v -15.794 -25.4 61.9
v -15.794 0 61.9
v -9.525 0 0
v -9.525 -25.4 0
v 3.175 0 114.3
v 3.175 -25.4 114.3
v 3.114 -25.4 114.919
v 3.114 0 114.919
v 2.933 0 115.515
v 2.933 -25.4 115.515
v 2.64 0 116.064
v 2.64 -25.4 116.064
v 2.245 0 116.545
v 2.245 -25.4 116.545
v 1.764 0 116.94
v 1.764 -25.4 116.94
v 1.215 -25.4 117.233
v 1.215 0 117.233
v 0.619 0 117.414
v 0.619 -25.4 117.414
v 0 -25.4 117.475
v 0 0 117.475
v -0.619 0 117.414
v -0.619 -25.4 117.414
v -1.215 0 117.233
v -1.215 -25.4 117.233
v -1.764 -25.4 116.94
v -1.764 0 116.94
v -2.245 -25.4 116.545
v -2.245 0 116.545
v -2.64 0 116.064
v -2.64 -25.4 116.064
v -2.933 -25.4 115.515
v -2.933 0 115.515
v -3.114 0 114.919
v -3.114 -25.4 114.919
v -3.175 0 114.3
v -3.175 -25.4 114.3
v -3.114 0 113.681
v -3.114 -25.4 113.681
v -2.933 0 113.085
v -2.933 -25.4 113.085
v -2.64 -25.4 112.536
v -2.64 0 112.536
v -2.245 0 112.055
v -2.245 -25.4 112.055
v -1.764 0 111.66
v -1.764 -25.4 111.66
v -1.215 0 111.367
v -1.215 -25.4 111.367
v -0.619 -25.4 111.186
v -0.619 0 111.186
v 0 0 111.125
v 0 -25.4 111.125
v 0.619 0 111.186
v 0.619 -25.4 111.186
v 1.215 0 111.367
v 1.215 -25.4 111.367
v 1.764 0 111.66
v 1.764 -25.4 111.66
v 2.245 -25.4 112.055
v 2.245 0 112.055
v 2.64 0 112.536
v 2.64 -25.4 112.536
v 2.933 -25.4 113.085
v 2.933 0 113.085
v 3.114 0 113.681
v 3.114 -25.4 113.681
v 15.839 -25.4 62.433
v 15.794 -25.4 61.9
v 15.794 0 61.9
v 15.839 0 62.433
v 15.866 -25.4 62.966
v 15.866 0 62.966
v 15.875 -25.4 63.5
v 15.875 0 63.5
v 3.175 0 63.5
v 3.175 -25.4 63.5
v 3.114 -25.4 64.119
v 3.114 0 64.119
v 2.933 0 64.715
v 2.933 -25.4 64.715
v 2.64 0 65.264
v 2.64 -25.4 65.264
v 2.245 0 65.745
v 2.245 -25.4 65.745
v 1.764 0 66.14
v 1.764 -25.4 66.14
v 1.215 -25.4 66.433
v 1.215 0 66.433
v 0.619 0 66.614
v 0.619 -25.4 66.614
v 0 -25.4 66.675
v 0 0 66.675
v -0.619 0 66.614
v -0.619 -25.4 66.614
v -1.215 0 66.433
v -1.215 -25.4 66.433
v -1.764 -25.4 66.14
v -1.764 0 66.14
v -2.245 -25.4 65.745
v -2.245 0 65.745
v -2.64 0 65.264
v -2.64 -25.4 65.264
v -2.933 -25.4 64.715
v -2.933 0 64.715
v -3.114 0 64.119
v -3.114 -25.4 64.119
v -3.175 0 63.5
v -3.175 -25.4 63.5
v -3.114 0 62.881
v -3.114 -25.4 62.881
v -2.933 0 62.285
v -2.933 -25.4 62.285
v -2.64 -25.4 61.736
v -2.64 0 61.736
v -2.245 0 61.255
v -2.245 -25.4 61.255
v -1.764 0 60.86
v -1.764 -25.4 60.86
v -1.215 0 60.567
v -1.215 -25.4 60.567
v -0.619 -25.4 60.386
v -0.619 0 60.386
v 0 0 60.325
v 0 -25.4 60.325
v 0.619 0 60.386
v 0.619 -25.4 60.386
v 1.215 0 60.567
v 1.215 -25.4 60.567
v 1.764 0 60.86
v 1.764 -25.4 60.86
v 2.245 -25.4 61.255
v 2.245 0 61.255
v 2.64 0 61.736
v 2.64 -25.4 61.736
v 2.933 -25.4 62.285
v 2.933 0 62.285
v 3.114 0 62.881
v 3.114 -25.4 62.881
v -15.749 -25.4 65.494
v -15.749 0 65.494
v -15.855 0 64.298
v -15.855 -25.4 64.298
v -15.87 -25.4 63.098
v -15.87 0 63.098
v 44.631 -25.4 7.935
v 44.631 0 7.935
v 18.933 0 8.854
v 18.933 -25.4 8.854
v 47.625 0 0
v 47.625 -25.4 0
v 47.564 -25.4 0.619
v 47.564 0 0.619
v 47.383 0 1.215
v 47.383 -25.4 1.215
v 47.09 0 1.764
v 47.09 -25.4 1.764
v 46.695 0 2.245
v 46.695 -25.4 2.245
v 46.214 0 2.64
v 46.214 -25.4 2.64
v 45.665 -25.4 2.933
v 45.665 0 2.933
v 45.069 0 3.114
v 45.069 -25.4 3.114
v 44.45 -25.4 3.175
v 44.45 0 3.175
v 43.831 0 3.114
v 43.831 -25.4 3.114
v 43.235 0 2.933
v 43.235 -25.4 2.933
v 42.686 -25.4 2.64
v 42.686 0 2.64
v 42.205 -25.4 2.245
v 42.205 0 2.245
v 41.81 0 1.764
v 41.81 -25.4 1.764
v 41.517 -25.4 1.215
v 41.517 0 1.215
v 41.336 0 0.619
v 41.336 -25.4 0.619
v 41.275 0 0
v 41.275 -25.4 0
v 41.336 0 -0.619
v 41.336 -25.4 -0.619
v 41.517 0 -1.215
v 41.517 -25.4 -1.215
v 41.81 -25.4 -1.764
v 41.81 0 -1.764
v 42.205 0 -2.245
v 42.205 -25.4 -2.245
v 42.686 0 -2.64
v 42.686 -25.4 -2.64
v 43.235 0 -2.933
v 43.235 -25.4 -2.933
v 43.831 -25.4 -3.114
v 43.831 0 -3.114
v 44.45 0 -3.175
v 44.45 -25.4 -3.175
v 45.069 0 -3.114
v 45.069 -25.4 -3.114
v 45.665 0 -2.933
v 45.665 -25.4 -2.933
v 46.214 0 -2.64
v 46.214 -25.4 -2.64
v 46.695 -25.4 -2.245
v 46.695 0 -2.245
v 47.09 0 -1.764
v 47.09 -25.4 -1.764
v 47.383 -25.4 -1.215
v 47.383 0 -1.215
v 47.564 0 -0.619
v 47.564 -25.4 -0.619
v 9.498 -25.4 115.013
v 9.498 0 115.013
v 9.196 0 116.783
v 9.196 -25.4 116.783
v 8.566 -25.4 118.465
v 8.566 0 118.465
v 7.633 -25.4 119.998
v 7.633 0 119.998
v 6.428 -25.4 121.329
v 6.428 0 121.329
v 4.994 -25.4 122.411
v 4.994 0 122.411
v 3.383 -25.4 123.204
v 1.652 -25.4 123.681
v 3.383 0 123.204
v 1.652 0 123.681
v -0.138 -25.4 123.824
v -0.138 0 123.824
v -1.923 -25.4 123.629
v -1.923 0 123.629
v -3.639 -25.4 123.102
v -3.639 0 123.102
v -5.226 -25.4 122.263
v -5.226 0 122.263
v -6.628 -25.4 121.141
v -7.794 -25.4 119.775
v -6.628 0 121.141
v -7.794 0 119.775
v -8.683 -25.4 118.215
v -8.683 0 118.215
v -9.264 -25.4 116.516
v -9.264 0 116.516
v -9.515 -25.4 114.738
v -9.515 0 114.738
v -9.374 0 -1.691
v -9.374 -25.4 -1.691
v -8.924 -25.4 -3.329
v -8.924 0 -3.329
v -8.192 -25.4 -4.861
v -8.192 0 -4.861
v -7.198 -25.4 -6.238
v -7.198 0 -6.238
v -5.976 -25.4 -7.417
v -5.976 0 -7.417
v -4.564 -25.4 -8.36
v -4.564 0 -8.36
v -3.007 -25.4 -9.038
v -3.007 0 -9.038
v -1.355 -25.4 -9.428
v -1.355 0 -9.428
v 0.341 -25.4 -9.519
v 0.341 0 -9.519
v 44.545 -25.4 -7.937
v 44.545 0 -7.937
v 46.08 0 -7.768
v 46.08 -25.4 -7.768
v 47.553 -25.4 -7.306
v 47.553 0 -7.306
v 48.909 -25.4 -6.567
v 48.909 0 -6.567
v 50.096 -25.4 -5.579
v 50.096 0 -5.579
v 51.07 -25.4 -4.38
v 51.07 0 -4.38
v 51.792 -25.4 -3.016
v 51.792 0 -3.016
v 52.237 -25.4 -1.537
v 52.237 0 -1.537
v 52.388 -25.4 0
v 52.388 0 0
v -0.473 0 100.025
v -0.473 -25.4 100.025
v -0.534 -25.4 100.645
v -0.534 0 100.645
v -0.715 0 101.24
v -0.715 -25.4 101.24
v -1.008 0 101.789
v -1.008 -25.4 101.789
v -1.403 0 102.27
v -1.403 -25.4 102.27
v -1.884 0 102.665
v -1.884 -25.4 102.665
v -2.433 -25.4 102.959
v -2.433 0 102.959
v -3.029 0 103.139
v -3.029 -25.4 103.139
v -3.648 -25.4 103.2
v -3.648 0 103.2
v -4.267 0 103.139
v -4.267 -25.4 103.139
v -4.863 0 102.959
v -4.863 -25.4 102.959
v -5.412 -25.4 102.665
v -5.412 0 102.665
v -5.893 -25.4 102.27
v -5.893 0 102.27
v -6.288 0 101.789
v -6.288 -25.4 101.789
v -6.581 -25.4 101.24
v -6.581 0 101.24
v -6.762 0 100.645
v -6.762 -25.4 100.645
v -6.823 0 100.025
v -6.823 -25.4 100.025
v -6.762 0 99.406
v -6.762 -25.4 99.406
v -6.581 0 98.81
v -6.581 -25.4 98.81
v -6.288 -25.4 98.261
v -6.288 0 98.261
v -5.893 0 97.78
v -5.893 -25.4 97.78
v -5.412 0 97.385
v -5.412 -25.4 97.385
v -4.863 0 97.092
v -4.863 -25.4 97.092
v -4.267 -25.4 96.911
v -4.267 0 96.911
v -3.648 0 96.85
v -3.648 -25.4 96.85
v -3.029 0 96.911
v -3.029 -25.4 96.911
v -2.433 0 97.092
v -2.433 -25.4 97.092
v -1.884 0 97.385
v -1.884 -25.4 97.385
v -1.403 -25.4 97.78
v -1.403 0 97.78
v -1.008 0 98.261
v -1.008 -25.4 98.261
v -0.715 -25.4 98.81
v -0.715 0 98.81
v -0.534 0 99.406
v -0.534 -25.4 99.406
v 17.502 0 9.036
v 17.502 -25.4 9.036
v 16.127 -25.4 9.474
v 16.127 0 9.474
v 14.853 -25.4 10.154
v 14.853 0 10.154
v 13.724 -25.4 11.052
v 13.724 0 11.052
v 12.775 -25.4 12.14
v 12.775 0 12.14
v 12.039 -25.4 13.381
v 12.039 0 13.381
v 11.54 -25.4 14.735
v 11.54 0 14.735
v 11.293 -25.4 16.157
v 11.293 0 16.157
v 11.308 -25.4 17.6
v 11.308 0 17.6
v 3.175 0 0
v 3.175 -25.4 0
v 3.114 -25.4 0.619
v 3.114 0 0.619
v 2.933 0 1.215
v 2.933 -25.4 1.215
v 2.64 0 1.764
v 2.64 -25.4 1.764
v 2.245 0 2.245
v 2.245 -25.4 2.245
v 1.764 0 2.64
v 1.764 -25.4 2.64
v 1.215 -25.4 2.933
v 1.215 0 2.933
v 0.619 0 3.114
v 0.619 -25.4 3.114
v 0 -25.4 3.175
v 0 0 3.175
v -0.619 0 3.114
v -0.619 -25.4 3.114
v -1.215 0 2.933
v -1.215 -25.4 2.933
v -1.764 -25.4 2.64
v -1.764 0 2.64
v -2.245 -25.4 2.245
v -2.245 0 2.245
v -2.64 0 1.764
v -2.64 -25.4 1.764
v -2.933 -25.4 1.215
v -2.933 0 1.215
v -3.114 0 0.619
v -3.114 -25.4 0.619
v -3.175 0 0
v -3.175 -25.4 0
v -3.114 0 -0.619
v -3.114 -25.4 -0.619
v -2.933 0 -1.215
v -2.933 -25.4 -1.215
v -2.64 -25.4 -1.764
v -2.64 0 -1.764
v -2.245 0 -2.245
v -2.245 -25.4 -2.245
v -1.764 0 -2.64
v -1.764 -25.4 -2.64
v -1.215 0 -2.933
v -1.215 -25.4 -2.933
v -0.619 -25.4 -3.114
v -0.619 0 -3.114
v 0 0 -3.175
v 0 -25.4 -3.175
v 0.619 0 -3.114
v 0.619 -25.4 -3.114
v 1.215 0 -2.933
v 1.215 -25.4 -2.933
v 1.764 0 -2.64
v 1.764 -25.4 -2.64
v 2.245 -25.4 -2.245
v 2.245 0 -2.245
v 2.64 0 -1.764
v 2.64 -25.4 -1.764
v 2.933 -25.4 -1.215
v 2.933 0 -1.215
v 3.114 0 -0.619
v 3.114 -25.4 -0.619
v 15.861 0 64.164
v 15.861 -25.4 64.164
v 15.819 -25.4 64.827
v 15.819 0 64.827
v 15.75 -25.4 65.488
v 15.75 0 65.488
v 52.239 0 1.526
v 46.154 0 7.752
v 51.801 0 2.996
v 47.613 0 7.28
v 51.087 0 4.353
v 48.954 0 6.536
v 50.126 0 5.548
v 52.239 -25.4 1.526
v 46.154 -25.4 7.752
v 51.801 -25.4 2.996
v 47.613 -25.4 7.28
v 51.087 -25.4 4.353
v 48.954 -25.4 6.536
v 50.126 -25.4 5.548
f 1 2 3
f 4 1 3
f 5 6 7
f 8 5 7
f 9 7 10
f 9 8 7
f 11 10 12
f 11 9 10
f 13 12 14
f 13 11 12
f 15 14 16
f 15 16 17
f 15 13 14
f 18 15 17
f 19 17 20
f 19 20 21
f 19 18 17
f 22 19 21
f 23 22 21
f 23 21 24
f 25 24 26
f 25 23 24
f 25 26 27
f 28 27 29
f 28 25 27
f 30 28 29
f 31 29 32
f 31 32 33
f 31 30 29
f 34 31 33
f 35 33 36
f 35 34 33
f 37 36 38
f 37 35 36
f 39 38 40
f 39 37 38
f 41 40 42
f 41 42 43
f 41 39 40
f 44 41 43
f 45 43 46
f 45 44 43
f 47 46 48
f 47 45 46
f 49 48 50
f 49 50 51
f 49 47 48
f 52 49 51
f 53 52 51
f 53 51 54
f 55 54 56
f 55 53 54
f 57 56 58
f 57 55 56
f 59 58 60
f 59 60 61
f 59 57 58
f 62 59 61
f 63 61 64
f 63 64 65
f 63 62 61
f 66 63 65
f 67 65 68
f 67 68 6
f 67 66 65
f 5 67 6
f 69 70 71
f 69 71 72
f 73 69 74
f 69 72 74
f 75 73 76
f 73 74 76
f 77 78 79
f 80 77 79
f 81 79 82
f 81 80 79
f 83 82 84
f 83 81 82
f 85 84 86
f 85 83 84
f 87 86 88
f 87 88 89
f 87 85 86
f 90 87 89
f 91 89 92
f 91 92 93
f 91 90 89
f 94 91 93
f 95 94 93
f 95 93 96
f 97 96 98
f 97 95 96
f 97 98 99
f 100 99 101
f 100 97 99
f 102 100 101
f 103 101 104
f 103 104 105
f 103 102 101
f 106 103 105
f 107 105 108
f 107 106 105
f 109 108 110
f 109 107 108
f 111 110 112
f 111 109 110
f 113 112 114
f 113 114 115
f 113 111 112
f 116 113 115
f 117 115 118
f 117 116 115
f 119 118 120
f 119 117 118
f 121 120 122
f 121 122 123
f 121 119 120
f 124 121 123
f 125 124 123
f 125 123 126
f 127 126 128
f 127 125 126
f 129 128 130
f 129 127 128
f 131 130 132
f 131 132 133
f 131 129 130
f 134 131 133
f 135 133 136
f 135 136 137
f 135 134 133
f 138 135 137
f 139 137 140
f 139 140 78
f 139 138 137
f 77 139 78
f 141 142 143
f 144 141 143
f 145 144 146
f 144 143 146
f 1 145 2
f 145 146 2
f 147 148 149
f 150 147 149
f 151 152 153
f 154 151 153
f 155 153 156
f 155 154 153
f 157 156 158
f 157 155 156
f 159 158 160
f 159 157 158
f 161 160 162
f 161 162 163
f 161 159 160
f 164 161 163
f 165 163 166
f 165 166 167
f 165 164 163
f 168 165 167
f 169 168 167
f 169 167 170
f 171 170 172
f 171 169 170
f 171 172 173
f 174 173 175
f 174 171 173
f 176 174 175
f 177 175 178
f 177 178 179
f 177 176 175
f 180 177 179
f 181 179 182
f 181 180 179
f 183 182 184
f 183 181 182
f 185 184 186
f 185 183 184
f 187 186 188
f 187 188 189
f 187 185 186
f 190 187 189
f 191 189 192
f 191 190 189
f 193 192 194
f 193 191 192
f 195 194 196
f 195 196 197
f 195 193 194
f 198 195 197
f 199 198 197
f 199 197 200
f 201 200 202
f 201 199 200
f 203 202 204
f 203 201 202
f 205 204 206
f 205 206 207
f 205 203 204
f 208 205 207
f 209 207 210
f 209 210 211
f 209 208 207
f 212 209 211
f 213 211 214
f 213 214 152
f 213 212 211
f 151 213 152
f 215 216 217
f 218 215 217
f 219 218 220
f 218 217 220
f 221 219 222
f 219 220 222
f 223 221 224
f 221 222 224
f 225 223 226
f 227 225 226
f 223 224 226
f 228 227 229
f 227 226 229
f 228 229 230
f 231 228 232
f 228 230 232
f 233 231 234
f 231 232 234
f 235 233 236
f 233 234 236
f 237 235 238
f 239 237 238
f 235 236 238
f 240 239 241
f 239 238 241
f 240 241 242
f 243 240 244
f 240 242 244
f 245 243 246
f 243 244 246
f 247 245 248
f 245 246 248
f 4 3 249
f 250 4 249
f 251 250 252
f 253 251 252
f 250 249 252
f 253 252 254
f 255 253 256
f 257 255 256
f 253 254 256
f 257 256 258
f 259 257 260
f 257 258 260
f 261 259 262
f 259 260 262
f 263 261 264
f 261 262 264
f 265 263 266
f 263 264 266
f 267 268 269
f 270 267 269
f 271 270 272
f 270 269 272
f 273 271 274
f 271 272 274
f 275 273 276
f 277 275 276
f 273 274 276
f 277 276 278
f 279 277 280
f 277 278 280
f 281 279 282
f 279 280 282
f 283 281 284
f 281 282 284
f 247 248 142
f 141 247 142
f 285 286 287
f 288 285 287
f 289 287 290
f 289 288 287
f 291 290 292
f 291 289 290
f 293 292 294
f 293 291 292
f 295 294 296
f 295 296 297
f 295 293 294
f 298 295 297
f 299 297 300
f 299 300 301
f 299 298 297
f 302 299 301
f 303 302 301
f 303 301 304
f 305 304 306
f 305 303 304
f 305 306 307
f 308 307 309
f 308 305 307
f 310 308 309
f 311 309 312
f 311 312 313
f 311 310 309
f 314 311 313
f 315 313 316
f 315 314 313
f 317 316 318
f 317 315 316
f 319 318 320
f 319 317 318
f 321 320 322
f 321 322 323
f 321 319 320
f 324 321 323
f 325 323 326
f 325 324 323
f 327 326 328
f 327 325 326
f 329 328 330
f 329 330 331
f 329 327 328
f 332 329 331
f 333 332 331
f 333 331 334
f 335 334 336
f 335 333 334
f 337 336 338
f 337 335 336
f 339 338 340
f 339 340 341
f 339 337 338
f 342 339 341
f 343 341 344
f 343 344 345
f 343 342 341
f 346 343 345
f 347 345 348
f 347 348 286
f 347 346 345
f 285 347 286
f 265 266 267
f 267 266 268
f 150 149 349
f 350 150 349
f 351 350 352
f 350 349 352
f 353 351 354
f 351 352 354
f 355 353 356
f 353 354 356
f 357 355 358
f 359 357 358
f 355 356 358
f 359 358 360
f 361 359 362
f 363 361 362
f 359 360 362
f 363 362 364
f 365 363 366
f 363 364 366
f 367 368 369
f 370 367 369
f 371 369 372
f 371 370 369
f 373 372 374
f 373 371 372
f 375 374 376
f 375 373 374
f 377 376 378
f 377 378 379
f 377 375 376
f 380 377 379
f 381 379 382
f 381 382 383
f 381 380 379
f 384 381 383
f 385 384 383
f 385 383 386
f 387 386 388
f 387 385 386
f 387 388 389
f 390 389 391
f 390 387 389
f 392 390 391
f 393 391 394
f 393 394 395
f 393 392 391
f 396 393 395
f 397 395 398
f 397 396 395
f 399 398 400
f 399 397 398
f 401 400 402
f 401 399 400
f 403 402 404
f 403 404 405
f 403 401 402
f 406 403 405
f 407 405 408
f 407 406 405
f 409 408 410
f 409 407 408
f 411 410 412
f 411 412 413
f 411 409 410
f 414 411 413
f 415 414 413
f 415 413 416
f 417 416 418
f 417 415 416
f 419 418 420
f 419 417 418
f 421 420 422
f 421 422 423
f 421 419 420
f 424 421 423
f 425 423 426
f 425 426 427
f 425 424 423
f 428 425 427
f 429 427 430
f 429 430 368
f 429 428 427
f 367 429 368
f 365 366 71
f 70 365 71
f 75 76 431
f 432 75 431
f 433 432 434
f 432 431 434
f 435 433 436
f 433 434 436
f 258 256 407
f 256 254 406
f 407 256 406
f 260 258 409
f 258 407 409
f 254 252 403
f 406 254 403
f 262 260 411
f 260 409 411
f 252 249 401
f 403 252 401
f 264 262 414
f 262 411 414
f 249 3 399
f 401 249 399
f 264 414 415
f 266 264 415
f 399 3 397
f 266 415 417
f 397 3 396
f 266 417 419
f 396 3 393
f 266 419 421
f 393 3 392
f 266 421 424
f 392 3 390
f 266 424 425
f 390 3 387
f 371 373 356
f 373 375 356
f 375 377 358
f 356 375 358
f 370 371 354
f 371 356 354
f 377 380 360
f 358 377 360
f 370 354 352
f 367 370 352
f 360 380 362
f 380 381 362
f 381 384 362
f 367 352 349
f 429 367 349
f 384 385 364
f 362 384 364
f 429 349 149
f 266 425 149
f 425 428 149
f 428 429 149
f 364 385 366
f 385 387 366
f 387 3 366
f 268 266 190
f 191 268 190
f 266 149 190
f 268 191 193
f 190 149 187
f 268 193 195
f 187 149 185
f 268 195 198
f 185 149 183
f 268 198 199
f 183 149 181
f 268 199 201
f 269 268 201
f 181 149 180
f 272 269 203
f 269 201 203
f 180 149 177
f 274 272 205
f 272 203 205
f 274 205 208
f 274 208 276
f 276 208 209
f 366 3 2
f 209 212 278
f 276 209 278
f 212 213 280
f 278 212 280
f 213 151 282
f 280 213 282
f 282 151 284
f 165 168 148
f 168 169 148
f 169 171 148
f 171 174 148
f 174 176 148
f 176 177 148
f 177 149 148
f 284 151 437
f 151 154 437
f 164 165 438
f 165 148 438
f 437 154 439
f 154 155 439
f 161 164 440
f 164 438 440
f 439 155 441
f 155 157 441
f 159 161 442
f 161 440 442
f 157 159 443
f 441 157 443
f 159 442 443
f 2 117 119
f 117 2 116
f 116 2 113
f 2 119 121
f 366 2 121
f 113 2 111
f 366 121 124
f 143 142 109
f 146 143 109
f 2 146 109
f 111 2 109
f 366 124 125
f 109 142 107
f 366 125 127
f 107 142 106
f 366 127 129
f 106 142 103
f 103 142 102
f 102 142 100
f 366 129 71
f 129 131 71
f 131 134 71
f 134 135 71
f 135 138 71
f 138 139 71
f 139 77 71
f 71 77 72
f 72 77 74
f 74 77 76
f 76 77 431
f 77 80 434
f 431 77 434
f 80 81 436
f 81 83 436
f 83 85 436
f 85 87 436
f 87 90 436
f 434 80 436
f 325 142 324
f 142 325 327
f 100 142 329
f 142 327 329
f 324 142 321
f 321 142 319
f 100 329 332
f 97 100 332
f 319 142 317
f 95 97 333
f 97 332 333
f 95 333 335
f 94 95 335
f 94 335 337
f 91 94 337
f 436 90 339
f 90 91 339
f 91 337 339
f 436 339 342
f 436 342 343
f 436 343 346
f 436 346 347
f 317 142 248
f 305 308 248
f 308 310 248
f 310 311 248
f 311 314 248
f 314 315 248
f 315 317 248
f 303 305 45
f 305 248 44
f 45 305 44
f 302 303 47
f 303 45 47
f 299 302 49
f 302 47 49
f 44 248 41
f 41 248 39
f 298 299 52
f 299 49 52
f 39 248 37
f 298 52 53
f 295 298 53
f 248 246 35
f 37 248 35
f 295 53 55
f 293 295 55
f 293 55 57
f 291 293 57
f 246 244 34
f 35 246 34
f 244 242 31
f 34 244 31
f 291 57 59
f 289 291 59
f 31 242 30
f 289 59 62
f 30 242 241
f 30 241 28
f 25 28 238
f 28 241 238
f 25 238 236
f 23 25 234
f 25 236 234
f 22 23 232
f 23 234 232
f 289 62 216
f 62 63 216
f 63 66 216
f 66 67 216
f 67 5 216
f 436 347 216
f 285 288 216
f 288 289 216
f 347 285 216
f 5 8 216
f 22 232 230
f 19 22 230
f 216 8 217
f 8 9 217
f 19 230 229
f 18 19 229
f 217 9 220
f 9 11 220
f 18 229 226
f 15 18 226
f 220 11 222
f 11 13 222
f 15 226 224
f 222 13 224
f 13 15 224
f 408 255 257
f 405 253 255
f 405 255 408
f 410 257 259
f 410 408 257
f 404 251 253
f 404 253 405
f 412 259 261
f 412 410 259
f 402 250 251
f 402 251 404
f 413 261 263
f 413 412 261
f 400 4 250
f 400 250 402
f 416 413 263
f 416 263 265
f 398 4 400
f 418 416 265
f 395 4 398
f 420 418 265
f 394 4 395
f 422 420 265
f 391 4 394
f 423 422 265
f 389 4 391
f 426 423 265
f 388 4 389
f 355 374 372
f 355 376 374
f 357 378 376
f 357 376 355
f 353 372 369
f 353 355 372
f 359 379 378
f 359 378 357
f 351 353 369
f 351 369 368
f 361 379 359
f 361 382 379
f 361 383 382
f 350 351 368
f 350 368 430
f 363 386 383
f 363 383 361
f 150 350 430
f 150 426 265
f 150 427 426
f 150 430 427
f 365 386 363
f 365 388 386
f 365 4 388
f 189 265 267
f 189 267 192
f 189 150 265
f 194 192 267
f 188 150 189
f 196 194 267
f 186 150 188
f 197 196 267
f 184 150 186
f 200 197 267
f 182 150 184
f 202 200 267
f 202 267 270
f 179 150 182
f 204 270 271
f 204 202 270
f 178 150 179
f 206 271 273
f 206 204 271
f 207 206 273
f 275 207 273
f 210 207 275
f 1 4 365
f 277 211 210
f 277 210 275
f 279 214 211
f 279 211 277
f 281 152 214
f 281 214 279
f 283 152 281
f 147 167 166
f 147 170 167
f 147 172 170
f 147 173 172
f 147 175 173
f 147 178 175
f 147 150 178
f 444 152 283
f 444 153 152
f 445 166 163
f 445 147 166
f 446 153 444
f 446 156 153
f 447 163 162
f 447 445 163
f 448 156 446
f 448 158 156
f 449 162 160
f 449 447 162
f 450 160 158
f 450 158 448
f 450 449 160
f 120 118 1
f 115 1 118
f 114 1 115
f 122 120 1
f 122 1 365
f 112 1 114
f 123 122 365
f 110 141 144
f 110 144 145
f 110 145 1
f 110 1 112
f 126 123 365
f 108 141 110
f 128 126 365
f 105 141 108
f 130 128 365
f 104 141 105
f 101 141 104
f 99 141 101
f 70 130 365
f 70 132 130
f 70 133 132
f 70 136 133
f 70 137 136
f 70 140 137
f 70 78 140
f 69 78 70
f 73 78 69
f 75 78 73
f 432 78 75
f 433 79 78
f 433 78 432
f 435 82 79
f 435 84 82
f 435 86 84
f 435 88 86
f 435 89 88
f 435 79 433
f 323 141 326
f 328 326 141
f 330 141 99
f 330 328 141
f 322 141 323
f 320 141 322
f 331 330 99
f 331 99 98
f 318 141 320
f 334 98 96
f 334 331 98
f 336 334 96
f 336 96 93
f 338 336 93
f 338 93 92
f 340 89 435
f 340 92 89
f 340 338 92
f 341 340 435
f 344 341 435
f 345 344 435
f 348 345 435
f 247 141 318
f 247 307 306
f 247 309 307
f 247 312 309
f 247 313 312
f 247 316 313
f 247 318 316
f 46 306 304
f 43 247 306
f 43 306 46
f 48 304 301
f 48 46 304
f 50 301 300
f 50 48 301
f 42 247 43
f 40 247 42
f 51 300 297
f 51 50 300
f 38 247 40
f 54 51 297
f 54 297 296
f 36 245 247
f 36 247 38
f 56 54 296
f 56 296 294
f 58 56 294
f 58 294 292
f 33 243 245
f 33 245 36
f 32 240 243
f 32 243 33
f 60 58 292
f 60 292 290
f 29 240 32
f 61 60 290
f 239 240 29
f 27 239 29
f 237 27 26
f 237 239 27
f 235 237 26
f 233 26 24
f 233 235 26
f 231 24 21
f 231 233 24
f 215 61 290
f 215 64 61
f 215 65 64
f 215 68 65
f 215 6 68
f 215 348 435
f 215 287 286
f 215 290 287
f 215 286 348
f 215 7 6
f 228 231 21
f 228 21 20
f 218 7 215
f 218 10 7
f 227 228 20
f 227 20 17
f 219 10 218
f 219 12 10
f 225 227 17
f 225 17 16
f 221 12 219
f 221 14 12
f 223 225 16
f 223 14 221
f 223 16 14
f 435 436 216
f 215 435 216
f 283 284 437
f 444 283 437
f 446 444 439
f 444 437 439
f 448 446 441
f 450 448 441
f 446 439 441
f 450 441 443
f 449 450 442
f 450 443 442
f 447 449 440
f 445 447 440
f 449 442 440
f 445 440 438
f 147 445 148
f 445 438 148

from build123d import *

# Parameters (mm, degrees)
F0_R     = 3.175
F1_DEPTH = 25.4


# Not quite as in the source:
# - a feature names something its author has since deleted; it is built from what else it names


with BuildPart() as f1:
    # F0 (on Front) → F1 (new body)
    with BuildSketch(Plane.XZ):
        with BuildLine():
            ThreePointArc((-9.5149138168, 114.7382237551), (-0.2191699059, 104.7775218797), (9.525, 114.3))
            ThreePointArc((9.525, 114.3), (9.5183168712, 114.6567477241), (9.4982768633, 115.0129948306))
            ThreePointArc((9.4982768633, 115.0129948306), (-0.1376371427, 123.8240055133), (-9.5149138168, 114.7382237551))
        make_face()
        with Locations((0, 114.3)):
            Circle(F0_R, mode=Mode.SUBTRACT)
        with BuildLine():
            ThreePointArc((9.4982768633, 115.0129948306), (9.5183168712, 114.6567477241), (9.525, 114.3))
            ThreePointArc((9.525, 114.3), (-0.2191699059, 104.7775218797), (-9.5149138168, 114.7382237551))
            Line((-9.5149138168, 114.7382237551), (-15.7492887561, 65.4938727833))
            ThreePointArc((-15.7492887561, 65.4938727833), (0.002863253, 79.3749997418), (15.7500069708, 65.4881914948))
            Line((15.7500069708, 65.4881914948), (9.4982768633, 115.0129948306))
        make_face()
        with Locations((-3.6479982082, 100.0252)):
            Circle(F0_R, mode=Mode.SUBTRACT)
        with BuildLine():
            ThreePointArc((15.875, 63.5), (15.8437209276, 64.4960583162), (15.7500069708, 65.4881914948))
            ThreePointArc((15.7500069708, 65.4881914948), (0.002863253, 79.3749997418), (-15.7492887561, 65.4938727833))
            ThreePointArc((-15.7492887561, 65.4938727833), (-15.8737601653, 63.698401651), (-15.7942028036, 61.9003804205))
            ThreePointArc((-15.7942028036, 61.9003804205), (0, 47.625), (15.7942028036, 61.9003804205))
            ThreePointArc((15.7942028036, 61.9003804205), (15.8547878338, 62.6991705884), (15.875, 63.5))
        make_face()
        with Locations((0, 63.5)):
            Circle(F0_R, mode=Mode.SUBTRACT)
        with BuildLine():
            ThreePointArc((15.7942028036, 61.9003804205), (0, 47.625), (-15.7942028036, 61.9003804205))
            Line((-15.7942028036, 61.9003804205), (-9.525, 0))
            ThreePointArc((-9.525, 0), (0, 9.525), (9.525, 0))
            ThreePointArc((9.525, 0), (6.854575784, -6.6136537422), (0.3406607199, -9.5189062016))
            Line((0.3406607199, -9.5189062016), (44.5449382907, -7.9369322141))
            ThreePointArc((44.5449382907, -7.9369322141), (36.5126173213, 0.0431562547), (44.6312377373, 7.9354306205))
            Line((44.6312377373, 7.9354306205), (18.9332319933, 8.8541850706))
            ThreePointArc((18.9332319933, 8.8541850706), (13.2249062601, 11.5746494613), (11.3075490968, 17.6003984343))
            Line((11.3075490968, 17.6003984343), (15.7942028036, 61.9003804205))
        make_face()
        with BuildLine():
            ThreePointArc((9.525, 0), (0, 9.525), (-9.525, 0))
            ThreePointArc((-9.525, 0), (-6.6136537422, -6.854575784), (0.3406607199, -9.5189062016))
            ThreePointArc((0.3406607199, -9.5189062016), (6.854575784, -6.6136537422), (9.525, 0))
        make_face()
        Circle(F0_R, mode=Mode.SUBTRACT)
        with BuildLine():
            ThreePointArc((44.6312377373, 7.9354306205), (36.5126173213, 0.0431562547), (44.5449382907, -7.9369322141))
            ThreePointArc((44.5449382907, -7.9369322141), (50.0961260583, -5.5789933486), (52.3875, 0))
            ThreePointArc((52.3875, 0), (50.126375639, 5.5482128524), (44.6312377373, 7.9354306205))
        make_face()
        with Locations((44.45, 0)):
            Circle(F0_R, mode=Mode.SUBTRACT)
    extrude(amount=F1_DEPTH)


solid = f1.part
